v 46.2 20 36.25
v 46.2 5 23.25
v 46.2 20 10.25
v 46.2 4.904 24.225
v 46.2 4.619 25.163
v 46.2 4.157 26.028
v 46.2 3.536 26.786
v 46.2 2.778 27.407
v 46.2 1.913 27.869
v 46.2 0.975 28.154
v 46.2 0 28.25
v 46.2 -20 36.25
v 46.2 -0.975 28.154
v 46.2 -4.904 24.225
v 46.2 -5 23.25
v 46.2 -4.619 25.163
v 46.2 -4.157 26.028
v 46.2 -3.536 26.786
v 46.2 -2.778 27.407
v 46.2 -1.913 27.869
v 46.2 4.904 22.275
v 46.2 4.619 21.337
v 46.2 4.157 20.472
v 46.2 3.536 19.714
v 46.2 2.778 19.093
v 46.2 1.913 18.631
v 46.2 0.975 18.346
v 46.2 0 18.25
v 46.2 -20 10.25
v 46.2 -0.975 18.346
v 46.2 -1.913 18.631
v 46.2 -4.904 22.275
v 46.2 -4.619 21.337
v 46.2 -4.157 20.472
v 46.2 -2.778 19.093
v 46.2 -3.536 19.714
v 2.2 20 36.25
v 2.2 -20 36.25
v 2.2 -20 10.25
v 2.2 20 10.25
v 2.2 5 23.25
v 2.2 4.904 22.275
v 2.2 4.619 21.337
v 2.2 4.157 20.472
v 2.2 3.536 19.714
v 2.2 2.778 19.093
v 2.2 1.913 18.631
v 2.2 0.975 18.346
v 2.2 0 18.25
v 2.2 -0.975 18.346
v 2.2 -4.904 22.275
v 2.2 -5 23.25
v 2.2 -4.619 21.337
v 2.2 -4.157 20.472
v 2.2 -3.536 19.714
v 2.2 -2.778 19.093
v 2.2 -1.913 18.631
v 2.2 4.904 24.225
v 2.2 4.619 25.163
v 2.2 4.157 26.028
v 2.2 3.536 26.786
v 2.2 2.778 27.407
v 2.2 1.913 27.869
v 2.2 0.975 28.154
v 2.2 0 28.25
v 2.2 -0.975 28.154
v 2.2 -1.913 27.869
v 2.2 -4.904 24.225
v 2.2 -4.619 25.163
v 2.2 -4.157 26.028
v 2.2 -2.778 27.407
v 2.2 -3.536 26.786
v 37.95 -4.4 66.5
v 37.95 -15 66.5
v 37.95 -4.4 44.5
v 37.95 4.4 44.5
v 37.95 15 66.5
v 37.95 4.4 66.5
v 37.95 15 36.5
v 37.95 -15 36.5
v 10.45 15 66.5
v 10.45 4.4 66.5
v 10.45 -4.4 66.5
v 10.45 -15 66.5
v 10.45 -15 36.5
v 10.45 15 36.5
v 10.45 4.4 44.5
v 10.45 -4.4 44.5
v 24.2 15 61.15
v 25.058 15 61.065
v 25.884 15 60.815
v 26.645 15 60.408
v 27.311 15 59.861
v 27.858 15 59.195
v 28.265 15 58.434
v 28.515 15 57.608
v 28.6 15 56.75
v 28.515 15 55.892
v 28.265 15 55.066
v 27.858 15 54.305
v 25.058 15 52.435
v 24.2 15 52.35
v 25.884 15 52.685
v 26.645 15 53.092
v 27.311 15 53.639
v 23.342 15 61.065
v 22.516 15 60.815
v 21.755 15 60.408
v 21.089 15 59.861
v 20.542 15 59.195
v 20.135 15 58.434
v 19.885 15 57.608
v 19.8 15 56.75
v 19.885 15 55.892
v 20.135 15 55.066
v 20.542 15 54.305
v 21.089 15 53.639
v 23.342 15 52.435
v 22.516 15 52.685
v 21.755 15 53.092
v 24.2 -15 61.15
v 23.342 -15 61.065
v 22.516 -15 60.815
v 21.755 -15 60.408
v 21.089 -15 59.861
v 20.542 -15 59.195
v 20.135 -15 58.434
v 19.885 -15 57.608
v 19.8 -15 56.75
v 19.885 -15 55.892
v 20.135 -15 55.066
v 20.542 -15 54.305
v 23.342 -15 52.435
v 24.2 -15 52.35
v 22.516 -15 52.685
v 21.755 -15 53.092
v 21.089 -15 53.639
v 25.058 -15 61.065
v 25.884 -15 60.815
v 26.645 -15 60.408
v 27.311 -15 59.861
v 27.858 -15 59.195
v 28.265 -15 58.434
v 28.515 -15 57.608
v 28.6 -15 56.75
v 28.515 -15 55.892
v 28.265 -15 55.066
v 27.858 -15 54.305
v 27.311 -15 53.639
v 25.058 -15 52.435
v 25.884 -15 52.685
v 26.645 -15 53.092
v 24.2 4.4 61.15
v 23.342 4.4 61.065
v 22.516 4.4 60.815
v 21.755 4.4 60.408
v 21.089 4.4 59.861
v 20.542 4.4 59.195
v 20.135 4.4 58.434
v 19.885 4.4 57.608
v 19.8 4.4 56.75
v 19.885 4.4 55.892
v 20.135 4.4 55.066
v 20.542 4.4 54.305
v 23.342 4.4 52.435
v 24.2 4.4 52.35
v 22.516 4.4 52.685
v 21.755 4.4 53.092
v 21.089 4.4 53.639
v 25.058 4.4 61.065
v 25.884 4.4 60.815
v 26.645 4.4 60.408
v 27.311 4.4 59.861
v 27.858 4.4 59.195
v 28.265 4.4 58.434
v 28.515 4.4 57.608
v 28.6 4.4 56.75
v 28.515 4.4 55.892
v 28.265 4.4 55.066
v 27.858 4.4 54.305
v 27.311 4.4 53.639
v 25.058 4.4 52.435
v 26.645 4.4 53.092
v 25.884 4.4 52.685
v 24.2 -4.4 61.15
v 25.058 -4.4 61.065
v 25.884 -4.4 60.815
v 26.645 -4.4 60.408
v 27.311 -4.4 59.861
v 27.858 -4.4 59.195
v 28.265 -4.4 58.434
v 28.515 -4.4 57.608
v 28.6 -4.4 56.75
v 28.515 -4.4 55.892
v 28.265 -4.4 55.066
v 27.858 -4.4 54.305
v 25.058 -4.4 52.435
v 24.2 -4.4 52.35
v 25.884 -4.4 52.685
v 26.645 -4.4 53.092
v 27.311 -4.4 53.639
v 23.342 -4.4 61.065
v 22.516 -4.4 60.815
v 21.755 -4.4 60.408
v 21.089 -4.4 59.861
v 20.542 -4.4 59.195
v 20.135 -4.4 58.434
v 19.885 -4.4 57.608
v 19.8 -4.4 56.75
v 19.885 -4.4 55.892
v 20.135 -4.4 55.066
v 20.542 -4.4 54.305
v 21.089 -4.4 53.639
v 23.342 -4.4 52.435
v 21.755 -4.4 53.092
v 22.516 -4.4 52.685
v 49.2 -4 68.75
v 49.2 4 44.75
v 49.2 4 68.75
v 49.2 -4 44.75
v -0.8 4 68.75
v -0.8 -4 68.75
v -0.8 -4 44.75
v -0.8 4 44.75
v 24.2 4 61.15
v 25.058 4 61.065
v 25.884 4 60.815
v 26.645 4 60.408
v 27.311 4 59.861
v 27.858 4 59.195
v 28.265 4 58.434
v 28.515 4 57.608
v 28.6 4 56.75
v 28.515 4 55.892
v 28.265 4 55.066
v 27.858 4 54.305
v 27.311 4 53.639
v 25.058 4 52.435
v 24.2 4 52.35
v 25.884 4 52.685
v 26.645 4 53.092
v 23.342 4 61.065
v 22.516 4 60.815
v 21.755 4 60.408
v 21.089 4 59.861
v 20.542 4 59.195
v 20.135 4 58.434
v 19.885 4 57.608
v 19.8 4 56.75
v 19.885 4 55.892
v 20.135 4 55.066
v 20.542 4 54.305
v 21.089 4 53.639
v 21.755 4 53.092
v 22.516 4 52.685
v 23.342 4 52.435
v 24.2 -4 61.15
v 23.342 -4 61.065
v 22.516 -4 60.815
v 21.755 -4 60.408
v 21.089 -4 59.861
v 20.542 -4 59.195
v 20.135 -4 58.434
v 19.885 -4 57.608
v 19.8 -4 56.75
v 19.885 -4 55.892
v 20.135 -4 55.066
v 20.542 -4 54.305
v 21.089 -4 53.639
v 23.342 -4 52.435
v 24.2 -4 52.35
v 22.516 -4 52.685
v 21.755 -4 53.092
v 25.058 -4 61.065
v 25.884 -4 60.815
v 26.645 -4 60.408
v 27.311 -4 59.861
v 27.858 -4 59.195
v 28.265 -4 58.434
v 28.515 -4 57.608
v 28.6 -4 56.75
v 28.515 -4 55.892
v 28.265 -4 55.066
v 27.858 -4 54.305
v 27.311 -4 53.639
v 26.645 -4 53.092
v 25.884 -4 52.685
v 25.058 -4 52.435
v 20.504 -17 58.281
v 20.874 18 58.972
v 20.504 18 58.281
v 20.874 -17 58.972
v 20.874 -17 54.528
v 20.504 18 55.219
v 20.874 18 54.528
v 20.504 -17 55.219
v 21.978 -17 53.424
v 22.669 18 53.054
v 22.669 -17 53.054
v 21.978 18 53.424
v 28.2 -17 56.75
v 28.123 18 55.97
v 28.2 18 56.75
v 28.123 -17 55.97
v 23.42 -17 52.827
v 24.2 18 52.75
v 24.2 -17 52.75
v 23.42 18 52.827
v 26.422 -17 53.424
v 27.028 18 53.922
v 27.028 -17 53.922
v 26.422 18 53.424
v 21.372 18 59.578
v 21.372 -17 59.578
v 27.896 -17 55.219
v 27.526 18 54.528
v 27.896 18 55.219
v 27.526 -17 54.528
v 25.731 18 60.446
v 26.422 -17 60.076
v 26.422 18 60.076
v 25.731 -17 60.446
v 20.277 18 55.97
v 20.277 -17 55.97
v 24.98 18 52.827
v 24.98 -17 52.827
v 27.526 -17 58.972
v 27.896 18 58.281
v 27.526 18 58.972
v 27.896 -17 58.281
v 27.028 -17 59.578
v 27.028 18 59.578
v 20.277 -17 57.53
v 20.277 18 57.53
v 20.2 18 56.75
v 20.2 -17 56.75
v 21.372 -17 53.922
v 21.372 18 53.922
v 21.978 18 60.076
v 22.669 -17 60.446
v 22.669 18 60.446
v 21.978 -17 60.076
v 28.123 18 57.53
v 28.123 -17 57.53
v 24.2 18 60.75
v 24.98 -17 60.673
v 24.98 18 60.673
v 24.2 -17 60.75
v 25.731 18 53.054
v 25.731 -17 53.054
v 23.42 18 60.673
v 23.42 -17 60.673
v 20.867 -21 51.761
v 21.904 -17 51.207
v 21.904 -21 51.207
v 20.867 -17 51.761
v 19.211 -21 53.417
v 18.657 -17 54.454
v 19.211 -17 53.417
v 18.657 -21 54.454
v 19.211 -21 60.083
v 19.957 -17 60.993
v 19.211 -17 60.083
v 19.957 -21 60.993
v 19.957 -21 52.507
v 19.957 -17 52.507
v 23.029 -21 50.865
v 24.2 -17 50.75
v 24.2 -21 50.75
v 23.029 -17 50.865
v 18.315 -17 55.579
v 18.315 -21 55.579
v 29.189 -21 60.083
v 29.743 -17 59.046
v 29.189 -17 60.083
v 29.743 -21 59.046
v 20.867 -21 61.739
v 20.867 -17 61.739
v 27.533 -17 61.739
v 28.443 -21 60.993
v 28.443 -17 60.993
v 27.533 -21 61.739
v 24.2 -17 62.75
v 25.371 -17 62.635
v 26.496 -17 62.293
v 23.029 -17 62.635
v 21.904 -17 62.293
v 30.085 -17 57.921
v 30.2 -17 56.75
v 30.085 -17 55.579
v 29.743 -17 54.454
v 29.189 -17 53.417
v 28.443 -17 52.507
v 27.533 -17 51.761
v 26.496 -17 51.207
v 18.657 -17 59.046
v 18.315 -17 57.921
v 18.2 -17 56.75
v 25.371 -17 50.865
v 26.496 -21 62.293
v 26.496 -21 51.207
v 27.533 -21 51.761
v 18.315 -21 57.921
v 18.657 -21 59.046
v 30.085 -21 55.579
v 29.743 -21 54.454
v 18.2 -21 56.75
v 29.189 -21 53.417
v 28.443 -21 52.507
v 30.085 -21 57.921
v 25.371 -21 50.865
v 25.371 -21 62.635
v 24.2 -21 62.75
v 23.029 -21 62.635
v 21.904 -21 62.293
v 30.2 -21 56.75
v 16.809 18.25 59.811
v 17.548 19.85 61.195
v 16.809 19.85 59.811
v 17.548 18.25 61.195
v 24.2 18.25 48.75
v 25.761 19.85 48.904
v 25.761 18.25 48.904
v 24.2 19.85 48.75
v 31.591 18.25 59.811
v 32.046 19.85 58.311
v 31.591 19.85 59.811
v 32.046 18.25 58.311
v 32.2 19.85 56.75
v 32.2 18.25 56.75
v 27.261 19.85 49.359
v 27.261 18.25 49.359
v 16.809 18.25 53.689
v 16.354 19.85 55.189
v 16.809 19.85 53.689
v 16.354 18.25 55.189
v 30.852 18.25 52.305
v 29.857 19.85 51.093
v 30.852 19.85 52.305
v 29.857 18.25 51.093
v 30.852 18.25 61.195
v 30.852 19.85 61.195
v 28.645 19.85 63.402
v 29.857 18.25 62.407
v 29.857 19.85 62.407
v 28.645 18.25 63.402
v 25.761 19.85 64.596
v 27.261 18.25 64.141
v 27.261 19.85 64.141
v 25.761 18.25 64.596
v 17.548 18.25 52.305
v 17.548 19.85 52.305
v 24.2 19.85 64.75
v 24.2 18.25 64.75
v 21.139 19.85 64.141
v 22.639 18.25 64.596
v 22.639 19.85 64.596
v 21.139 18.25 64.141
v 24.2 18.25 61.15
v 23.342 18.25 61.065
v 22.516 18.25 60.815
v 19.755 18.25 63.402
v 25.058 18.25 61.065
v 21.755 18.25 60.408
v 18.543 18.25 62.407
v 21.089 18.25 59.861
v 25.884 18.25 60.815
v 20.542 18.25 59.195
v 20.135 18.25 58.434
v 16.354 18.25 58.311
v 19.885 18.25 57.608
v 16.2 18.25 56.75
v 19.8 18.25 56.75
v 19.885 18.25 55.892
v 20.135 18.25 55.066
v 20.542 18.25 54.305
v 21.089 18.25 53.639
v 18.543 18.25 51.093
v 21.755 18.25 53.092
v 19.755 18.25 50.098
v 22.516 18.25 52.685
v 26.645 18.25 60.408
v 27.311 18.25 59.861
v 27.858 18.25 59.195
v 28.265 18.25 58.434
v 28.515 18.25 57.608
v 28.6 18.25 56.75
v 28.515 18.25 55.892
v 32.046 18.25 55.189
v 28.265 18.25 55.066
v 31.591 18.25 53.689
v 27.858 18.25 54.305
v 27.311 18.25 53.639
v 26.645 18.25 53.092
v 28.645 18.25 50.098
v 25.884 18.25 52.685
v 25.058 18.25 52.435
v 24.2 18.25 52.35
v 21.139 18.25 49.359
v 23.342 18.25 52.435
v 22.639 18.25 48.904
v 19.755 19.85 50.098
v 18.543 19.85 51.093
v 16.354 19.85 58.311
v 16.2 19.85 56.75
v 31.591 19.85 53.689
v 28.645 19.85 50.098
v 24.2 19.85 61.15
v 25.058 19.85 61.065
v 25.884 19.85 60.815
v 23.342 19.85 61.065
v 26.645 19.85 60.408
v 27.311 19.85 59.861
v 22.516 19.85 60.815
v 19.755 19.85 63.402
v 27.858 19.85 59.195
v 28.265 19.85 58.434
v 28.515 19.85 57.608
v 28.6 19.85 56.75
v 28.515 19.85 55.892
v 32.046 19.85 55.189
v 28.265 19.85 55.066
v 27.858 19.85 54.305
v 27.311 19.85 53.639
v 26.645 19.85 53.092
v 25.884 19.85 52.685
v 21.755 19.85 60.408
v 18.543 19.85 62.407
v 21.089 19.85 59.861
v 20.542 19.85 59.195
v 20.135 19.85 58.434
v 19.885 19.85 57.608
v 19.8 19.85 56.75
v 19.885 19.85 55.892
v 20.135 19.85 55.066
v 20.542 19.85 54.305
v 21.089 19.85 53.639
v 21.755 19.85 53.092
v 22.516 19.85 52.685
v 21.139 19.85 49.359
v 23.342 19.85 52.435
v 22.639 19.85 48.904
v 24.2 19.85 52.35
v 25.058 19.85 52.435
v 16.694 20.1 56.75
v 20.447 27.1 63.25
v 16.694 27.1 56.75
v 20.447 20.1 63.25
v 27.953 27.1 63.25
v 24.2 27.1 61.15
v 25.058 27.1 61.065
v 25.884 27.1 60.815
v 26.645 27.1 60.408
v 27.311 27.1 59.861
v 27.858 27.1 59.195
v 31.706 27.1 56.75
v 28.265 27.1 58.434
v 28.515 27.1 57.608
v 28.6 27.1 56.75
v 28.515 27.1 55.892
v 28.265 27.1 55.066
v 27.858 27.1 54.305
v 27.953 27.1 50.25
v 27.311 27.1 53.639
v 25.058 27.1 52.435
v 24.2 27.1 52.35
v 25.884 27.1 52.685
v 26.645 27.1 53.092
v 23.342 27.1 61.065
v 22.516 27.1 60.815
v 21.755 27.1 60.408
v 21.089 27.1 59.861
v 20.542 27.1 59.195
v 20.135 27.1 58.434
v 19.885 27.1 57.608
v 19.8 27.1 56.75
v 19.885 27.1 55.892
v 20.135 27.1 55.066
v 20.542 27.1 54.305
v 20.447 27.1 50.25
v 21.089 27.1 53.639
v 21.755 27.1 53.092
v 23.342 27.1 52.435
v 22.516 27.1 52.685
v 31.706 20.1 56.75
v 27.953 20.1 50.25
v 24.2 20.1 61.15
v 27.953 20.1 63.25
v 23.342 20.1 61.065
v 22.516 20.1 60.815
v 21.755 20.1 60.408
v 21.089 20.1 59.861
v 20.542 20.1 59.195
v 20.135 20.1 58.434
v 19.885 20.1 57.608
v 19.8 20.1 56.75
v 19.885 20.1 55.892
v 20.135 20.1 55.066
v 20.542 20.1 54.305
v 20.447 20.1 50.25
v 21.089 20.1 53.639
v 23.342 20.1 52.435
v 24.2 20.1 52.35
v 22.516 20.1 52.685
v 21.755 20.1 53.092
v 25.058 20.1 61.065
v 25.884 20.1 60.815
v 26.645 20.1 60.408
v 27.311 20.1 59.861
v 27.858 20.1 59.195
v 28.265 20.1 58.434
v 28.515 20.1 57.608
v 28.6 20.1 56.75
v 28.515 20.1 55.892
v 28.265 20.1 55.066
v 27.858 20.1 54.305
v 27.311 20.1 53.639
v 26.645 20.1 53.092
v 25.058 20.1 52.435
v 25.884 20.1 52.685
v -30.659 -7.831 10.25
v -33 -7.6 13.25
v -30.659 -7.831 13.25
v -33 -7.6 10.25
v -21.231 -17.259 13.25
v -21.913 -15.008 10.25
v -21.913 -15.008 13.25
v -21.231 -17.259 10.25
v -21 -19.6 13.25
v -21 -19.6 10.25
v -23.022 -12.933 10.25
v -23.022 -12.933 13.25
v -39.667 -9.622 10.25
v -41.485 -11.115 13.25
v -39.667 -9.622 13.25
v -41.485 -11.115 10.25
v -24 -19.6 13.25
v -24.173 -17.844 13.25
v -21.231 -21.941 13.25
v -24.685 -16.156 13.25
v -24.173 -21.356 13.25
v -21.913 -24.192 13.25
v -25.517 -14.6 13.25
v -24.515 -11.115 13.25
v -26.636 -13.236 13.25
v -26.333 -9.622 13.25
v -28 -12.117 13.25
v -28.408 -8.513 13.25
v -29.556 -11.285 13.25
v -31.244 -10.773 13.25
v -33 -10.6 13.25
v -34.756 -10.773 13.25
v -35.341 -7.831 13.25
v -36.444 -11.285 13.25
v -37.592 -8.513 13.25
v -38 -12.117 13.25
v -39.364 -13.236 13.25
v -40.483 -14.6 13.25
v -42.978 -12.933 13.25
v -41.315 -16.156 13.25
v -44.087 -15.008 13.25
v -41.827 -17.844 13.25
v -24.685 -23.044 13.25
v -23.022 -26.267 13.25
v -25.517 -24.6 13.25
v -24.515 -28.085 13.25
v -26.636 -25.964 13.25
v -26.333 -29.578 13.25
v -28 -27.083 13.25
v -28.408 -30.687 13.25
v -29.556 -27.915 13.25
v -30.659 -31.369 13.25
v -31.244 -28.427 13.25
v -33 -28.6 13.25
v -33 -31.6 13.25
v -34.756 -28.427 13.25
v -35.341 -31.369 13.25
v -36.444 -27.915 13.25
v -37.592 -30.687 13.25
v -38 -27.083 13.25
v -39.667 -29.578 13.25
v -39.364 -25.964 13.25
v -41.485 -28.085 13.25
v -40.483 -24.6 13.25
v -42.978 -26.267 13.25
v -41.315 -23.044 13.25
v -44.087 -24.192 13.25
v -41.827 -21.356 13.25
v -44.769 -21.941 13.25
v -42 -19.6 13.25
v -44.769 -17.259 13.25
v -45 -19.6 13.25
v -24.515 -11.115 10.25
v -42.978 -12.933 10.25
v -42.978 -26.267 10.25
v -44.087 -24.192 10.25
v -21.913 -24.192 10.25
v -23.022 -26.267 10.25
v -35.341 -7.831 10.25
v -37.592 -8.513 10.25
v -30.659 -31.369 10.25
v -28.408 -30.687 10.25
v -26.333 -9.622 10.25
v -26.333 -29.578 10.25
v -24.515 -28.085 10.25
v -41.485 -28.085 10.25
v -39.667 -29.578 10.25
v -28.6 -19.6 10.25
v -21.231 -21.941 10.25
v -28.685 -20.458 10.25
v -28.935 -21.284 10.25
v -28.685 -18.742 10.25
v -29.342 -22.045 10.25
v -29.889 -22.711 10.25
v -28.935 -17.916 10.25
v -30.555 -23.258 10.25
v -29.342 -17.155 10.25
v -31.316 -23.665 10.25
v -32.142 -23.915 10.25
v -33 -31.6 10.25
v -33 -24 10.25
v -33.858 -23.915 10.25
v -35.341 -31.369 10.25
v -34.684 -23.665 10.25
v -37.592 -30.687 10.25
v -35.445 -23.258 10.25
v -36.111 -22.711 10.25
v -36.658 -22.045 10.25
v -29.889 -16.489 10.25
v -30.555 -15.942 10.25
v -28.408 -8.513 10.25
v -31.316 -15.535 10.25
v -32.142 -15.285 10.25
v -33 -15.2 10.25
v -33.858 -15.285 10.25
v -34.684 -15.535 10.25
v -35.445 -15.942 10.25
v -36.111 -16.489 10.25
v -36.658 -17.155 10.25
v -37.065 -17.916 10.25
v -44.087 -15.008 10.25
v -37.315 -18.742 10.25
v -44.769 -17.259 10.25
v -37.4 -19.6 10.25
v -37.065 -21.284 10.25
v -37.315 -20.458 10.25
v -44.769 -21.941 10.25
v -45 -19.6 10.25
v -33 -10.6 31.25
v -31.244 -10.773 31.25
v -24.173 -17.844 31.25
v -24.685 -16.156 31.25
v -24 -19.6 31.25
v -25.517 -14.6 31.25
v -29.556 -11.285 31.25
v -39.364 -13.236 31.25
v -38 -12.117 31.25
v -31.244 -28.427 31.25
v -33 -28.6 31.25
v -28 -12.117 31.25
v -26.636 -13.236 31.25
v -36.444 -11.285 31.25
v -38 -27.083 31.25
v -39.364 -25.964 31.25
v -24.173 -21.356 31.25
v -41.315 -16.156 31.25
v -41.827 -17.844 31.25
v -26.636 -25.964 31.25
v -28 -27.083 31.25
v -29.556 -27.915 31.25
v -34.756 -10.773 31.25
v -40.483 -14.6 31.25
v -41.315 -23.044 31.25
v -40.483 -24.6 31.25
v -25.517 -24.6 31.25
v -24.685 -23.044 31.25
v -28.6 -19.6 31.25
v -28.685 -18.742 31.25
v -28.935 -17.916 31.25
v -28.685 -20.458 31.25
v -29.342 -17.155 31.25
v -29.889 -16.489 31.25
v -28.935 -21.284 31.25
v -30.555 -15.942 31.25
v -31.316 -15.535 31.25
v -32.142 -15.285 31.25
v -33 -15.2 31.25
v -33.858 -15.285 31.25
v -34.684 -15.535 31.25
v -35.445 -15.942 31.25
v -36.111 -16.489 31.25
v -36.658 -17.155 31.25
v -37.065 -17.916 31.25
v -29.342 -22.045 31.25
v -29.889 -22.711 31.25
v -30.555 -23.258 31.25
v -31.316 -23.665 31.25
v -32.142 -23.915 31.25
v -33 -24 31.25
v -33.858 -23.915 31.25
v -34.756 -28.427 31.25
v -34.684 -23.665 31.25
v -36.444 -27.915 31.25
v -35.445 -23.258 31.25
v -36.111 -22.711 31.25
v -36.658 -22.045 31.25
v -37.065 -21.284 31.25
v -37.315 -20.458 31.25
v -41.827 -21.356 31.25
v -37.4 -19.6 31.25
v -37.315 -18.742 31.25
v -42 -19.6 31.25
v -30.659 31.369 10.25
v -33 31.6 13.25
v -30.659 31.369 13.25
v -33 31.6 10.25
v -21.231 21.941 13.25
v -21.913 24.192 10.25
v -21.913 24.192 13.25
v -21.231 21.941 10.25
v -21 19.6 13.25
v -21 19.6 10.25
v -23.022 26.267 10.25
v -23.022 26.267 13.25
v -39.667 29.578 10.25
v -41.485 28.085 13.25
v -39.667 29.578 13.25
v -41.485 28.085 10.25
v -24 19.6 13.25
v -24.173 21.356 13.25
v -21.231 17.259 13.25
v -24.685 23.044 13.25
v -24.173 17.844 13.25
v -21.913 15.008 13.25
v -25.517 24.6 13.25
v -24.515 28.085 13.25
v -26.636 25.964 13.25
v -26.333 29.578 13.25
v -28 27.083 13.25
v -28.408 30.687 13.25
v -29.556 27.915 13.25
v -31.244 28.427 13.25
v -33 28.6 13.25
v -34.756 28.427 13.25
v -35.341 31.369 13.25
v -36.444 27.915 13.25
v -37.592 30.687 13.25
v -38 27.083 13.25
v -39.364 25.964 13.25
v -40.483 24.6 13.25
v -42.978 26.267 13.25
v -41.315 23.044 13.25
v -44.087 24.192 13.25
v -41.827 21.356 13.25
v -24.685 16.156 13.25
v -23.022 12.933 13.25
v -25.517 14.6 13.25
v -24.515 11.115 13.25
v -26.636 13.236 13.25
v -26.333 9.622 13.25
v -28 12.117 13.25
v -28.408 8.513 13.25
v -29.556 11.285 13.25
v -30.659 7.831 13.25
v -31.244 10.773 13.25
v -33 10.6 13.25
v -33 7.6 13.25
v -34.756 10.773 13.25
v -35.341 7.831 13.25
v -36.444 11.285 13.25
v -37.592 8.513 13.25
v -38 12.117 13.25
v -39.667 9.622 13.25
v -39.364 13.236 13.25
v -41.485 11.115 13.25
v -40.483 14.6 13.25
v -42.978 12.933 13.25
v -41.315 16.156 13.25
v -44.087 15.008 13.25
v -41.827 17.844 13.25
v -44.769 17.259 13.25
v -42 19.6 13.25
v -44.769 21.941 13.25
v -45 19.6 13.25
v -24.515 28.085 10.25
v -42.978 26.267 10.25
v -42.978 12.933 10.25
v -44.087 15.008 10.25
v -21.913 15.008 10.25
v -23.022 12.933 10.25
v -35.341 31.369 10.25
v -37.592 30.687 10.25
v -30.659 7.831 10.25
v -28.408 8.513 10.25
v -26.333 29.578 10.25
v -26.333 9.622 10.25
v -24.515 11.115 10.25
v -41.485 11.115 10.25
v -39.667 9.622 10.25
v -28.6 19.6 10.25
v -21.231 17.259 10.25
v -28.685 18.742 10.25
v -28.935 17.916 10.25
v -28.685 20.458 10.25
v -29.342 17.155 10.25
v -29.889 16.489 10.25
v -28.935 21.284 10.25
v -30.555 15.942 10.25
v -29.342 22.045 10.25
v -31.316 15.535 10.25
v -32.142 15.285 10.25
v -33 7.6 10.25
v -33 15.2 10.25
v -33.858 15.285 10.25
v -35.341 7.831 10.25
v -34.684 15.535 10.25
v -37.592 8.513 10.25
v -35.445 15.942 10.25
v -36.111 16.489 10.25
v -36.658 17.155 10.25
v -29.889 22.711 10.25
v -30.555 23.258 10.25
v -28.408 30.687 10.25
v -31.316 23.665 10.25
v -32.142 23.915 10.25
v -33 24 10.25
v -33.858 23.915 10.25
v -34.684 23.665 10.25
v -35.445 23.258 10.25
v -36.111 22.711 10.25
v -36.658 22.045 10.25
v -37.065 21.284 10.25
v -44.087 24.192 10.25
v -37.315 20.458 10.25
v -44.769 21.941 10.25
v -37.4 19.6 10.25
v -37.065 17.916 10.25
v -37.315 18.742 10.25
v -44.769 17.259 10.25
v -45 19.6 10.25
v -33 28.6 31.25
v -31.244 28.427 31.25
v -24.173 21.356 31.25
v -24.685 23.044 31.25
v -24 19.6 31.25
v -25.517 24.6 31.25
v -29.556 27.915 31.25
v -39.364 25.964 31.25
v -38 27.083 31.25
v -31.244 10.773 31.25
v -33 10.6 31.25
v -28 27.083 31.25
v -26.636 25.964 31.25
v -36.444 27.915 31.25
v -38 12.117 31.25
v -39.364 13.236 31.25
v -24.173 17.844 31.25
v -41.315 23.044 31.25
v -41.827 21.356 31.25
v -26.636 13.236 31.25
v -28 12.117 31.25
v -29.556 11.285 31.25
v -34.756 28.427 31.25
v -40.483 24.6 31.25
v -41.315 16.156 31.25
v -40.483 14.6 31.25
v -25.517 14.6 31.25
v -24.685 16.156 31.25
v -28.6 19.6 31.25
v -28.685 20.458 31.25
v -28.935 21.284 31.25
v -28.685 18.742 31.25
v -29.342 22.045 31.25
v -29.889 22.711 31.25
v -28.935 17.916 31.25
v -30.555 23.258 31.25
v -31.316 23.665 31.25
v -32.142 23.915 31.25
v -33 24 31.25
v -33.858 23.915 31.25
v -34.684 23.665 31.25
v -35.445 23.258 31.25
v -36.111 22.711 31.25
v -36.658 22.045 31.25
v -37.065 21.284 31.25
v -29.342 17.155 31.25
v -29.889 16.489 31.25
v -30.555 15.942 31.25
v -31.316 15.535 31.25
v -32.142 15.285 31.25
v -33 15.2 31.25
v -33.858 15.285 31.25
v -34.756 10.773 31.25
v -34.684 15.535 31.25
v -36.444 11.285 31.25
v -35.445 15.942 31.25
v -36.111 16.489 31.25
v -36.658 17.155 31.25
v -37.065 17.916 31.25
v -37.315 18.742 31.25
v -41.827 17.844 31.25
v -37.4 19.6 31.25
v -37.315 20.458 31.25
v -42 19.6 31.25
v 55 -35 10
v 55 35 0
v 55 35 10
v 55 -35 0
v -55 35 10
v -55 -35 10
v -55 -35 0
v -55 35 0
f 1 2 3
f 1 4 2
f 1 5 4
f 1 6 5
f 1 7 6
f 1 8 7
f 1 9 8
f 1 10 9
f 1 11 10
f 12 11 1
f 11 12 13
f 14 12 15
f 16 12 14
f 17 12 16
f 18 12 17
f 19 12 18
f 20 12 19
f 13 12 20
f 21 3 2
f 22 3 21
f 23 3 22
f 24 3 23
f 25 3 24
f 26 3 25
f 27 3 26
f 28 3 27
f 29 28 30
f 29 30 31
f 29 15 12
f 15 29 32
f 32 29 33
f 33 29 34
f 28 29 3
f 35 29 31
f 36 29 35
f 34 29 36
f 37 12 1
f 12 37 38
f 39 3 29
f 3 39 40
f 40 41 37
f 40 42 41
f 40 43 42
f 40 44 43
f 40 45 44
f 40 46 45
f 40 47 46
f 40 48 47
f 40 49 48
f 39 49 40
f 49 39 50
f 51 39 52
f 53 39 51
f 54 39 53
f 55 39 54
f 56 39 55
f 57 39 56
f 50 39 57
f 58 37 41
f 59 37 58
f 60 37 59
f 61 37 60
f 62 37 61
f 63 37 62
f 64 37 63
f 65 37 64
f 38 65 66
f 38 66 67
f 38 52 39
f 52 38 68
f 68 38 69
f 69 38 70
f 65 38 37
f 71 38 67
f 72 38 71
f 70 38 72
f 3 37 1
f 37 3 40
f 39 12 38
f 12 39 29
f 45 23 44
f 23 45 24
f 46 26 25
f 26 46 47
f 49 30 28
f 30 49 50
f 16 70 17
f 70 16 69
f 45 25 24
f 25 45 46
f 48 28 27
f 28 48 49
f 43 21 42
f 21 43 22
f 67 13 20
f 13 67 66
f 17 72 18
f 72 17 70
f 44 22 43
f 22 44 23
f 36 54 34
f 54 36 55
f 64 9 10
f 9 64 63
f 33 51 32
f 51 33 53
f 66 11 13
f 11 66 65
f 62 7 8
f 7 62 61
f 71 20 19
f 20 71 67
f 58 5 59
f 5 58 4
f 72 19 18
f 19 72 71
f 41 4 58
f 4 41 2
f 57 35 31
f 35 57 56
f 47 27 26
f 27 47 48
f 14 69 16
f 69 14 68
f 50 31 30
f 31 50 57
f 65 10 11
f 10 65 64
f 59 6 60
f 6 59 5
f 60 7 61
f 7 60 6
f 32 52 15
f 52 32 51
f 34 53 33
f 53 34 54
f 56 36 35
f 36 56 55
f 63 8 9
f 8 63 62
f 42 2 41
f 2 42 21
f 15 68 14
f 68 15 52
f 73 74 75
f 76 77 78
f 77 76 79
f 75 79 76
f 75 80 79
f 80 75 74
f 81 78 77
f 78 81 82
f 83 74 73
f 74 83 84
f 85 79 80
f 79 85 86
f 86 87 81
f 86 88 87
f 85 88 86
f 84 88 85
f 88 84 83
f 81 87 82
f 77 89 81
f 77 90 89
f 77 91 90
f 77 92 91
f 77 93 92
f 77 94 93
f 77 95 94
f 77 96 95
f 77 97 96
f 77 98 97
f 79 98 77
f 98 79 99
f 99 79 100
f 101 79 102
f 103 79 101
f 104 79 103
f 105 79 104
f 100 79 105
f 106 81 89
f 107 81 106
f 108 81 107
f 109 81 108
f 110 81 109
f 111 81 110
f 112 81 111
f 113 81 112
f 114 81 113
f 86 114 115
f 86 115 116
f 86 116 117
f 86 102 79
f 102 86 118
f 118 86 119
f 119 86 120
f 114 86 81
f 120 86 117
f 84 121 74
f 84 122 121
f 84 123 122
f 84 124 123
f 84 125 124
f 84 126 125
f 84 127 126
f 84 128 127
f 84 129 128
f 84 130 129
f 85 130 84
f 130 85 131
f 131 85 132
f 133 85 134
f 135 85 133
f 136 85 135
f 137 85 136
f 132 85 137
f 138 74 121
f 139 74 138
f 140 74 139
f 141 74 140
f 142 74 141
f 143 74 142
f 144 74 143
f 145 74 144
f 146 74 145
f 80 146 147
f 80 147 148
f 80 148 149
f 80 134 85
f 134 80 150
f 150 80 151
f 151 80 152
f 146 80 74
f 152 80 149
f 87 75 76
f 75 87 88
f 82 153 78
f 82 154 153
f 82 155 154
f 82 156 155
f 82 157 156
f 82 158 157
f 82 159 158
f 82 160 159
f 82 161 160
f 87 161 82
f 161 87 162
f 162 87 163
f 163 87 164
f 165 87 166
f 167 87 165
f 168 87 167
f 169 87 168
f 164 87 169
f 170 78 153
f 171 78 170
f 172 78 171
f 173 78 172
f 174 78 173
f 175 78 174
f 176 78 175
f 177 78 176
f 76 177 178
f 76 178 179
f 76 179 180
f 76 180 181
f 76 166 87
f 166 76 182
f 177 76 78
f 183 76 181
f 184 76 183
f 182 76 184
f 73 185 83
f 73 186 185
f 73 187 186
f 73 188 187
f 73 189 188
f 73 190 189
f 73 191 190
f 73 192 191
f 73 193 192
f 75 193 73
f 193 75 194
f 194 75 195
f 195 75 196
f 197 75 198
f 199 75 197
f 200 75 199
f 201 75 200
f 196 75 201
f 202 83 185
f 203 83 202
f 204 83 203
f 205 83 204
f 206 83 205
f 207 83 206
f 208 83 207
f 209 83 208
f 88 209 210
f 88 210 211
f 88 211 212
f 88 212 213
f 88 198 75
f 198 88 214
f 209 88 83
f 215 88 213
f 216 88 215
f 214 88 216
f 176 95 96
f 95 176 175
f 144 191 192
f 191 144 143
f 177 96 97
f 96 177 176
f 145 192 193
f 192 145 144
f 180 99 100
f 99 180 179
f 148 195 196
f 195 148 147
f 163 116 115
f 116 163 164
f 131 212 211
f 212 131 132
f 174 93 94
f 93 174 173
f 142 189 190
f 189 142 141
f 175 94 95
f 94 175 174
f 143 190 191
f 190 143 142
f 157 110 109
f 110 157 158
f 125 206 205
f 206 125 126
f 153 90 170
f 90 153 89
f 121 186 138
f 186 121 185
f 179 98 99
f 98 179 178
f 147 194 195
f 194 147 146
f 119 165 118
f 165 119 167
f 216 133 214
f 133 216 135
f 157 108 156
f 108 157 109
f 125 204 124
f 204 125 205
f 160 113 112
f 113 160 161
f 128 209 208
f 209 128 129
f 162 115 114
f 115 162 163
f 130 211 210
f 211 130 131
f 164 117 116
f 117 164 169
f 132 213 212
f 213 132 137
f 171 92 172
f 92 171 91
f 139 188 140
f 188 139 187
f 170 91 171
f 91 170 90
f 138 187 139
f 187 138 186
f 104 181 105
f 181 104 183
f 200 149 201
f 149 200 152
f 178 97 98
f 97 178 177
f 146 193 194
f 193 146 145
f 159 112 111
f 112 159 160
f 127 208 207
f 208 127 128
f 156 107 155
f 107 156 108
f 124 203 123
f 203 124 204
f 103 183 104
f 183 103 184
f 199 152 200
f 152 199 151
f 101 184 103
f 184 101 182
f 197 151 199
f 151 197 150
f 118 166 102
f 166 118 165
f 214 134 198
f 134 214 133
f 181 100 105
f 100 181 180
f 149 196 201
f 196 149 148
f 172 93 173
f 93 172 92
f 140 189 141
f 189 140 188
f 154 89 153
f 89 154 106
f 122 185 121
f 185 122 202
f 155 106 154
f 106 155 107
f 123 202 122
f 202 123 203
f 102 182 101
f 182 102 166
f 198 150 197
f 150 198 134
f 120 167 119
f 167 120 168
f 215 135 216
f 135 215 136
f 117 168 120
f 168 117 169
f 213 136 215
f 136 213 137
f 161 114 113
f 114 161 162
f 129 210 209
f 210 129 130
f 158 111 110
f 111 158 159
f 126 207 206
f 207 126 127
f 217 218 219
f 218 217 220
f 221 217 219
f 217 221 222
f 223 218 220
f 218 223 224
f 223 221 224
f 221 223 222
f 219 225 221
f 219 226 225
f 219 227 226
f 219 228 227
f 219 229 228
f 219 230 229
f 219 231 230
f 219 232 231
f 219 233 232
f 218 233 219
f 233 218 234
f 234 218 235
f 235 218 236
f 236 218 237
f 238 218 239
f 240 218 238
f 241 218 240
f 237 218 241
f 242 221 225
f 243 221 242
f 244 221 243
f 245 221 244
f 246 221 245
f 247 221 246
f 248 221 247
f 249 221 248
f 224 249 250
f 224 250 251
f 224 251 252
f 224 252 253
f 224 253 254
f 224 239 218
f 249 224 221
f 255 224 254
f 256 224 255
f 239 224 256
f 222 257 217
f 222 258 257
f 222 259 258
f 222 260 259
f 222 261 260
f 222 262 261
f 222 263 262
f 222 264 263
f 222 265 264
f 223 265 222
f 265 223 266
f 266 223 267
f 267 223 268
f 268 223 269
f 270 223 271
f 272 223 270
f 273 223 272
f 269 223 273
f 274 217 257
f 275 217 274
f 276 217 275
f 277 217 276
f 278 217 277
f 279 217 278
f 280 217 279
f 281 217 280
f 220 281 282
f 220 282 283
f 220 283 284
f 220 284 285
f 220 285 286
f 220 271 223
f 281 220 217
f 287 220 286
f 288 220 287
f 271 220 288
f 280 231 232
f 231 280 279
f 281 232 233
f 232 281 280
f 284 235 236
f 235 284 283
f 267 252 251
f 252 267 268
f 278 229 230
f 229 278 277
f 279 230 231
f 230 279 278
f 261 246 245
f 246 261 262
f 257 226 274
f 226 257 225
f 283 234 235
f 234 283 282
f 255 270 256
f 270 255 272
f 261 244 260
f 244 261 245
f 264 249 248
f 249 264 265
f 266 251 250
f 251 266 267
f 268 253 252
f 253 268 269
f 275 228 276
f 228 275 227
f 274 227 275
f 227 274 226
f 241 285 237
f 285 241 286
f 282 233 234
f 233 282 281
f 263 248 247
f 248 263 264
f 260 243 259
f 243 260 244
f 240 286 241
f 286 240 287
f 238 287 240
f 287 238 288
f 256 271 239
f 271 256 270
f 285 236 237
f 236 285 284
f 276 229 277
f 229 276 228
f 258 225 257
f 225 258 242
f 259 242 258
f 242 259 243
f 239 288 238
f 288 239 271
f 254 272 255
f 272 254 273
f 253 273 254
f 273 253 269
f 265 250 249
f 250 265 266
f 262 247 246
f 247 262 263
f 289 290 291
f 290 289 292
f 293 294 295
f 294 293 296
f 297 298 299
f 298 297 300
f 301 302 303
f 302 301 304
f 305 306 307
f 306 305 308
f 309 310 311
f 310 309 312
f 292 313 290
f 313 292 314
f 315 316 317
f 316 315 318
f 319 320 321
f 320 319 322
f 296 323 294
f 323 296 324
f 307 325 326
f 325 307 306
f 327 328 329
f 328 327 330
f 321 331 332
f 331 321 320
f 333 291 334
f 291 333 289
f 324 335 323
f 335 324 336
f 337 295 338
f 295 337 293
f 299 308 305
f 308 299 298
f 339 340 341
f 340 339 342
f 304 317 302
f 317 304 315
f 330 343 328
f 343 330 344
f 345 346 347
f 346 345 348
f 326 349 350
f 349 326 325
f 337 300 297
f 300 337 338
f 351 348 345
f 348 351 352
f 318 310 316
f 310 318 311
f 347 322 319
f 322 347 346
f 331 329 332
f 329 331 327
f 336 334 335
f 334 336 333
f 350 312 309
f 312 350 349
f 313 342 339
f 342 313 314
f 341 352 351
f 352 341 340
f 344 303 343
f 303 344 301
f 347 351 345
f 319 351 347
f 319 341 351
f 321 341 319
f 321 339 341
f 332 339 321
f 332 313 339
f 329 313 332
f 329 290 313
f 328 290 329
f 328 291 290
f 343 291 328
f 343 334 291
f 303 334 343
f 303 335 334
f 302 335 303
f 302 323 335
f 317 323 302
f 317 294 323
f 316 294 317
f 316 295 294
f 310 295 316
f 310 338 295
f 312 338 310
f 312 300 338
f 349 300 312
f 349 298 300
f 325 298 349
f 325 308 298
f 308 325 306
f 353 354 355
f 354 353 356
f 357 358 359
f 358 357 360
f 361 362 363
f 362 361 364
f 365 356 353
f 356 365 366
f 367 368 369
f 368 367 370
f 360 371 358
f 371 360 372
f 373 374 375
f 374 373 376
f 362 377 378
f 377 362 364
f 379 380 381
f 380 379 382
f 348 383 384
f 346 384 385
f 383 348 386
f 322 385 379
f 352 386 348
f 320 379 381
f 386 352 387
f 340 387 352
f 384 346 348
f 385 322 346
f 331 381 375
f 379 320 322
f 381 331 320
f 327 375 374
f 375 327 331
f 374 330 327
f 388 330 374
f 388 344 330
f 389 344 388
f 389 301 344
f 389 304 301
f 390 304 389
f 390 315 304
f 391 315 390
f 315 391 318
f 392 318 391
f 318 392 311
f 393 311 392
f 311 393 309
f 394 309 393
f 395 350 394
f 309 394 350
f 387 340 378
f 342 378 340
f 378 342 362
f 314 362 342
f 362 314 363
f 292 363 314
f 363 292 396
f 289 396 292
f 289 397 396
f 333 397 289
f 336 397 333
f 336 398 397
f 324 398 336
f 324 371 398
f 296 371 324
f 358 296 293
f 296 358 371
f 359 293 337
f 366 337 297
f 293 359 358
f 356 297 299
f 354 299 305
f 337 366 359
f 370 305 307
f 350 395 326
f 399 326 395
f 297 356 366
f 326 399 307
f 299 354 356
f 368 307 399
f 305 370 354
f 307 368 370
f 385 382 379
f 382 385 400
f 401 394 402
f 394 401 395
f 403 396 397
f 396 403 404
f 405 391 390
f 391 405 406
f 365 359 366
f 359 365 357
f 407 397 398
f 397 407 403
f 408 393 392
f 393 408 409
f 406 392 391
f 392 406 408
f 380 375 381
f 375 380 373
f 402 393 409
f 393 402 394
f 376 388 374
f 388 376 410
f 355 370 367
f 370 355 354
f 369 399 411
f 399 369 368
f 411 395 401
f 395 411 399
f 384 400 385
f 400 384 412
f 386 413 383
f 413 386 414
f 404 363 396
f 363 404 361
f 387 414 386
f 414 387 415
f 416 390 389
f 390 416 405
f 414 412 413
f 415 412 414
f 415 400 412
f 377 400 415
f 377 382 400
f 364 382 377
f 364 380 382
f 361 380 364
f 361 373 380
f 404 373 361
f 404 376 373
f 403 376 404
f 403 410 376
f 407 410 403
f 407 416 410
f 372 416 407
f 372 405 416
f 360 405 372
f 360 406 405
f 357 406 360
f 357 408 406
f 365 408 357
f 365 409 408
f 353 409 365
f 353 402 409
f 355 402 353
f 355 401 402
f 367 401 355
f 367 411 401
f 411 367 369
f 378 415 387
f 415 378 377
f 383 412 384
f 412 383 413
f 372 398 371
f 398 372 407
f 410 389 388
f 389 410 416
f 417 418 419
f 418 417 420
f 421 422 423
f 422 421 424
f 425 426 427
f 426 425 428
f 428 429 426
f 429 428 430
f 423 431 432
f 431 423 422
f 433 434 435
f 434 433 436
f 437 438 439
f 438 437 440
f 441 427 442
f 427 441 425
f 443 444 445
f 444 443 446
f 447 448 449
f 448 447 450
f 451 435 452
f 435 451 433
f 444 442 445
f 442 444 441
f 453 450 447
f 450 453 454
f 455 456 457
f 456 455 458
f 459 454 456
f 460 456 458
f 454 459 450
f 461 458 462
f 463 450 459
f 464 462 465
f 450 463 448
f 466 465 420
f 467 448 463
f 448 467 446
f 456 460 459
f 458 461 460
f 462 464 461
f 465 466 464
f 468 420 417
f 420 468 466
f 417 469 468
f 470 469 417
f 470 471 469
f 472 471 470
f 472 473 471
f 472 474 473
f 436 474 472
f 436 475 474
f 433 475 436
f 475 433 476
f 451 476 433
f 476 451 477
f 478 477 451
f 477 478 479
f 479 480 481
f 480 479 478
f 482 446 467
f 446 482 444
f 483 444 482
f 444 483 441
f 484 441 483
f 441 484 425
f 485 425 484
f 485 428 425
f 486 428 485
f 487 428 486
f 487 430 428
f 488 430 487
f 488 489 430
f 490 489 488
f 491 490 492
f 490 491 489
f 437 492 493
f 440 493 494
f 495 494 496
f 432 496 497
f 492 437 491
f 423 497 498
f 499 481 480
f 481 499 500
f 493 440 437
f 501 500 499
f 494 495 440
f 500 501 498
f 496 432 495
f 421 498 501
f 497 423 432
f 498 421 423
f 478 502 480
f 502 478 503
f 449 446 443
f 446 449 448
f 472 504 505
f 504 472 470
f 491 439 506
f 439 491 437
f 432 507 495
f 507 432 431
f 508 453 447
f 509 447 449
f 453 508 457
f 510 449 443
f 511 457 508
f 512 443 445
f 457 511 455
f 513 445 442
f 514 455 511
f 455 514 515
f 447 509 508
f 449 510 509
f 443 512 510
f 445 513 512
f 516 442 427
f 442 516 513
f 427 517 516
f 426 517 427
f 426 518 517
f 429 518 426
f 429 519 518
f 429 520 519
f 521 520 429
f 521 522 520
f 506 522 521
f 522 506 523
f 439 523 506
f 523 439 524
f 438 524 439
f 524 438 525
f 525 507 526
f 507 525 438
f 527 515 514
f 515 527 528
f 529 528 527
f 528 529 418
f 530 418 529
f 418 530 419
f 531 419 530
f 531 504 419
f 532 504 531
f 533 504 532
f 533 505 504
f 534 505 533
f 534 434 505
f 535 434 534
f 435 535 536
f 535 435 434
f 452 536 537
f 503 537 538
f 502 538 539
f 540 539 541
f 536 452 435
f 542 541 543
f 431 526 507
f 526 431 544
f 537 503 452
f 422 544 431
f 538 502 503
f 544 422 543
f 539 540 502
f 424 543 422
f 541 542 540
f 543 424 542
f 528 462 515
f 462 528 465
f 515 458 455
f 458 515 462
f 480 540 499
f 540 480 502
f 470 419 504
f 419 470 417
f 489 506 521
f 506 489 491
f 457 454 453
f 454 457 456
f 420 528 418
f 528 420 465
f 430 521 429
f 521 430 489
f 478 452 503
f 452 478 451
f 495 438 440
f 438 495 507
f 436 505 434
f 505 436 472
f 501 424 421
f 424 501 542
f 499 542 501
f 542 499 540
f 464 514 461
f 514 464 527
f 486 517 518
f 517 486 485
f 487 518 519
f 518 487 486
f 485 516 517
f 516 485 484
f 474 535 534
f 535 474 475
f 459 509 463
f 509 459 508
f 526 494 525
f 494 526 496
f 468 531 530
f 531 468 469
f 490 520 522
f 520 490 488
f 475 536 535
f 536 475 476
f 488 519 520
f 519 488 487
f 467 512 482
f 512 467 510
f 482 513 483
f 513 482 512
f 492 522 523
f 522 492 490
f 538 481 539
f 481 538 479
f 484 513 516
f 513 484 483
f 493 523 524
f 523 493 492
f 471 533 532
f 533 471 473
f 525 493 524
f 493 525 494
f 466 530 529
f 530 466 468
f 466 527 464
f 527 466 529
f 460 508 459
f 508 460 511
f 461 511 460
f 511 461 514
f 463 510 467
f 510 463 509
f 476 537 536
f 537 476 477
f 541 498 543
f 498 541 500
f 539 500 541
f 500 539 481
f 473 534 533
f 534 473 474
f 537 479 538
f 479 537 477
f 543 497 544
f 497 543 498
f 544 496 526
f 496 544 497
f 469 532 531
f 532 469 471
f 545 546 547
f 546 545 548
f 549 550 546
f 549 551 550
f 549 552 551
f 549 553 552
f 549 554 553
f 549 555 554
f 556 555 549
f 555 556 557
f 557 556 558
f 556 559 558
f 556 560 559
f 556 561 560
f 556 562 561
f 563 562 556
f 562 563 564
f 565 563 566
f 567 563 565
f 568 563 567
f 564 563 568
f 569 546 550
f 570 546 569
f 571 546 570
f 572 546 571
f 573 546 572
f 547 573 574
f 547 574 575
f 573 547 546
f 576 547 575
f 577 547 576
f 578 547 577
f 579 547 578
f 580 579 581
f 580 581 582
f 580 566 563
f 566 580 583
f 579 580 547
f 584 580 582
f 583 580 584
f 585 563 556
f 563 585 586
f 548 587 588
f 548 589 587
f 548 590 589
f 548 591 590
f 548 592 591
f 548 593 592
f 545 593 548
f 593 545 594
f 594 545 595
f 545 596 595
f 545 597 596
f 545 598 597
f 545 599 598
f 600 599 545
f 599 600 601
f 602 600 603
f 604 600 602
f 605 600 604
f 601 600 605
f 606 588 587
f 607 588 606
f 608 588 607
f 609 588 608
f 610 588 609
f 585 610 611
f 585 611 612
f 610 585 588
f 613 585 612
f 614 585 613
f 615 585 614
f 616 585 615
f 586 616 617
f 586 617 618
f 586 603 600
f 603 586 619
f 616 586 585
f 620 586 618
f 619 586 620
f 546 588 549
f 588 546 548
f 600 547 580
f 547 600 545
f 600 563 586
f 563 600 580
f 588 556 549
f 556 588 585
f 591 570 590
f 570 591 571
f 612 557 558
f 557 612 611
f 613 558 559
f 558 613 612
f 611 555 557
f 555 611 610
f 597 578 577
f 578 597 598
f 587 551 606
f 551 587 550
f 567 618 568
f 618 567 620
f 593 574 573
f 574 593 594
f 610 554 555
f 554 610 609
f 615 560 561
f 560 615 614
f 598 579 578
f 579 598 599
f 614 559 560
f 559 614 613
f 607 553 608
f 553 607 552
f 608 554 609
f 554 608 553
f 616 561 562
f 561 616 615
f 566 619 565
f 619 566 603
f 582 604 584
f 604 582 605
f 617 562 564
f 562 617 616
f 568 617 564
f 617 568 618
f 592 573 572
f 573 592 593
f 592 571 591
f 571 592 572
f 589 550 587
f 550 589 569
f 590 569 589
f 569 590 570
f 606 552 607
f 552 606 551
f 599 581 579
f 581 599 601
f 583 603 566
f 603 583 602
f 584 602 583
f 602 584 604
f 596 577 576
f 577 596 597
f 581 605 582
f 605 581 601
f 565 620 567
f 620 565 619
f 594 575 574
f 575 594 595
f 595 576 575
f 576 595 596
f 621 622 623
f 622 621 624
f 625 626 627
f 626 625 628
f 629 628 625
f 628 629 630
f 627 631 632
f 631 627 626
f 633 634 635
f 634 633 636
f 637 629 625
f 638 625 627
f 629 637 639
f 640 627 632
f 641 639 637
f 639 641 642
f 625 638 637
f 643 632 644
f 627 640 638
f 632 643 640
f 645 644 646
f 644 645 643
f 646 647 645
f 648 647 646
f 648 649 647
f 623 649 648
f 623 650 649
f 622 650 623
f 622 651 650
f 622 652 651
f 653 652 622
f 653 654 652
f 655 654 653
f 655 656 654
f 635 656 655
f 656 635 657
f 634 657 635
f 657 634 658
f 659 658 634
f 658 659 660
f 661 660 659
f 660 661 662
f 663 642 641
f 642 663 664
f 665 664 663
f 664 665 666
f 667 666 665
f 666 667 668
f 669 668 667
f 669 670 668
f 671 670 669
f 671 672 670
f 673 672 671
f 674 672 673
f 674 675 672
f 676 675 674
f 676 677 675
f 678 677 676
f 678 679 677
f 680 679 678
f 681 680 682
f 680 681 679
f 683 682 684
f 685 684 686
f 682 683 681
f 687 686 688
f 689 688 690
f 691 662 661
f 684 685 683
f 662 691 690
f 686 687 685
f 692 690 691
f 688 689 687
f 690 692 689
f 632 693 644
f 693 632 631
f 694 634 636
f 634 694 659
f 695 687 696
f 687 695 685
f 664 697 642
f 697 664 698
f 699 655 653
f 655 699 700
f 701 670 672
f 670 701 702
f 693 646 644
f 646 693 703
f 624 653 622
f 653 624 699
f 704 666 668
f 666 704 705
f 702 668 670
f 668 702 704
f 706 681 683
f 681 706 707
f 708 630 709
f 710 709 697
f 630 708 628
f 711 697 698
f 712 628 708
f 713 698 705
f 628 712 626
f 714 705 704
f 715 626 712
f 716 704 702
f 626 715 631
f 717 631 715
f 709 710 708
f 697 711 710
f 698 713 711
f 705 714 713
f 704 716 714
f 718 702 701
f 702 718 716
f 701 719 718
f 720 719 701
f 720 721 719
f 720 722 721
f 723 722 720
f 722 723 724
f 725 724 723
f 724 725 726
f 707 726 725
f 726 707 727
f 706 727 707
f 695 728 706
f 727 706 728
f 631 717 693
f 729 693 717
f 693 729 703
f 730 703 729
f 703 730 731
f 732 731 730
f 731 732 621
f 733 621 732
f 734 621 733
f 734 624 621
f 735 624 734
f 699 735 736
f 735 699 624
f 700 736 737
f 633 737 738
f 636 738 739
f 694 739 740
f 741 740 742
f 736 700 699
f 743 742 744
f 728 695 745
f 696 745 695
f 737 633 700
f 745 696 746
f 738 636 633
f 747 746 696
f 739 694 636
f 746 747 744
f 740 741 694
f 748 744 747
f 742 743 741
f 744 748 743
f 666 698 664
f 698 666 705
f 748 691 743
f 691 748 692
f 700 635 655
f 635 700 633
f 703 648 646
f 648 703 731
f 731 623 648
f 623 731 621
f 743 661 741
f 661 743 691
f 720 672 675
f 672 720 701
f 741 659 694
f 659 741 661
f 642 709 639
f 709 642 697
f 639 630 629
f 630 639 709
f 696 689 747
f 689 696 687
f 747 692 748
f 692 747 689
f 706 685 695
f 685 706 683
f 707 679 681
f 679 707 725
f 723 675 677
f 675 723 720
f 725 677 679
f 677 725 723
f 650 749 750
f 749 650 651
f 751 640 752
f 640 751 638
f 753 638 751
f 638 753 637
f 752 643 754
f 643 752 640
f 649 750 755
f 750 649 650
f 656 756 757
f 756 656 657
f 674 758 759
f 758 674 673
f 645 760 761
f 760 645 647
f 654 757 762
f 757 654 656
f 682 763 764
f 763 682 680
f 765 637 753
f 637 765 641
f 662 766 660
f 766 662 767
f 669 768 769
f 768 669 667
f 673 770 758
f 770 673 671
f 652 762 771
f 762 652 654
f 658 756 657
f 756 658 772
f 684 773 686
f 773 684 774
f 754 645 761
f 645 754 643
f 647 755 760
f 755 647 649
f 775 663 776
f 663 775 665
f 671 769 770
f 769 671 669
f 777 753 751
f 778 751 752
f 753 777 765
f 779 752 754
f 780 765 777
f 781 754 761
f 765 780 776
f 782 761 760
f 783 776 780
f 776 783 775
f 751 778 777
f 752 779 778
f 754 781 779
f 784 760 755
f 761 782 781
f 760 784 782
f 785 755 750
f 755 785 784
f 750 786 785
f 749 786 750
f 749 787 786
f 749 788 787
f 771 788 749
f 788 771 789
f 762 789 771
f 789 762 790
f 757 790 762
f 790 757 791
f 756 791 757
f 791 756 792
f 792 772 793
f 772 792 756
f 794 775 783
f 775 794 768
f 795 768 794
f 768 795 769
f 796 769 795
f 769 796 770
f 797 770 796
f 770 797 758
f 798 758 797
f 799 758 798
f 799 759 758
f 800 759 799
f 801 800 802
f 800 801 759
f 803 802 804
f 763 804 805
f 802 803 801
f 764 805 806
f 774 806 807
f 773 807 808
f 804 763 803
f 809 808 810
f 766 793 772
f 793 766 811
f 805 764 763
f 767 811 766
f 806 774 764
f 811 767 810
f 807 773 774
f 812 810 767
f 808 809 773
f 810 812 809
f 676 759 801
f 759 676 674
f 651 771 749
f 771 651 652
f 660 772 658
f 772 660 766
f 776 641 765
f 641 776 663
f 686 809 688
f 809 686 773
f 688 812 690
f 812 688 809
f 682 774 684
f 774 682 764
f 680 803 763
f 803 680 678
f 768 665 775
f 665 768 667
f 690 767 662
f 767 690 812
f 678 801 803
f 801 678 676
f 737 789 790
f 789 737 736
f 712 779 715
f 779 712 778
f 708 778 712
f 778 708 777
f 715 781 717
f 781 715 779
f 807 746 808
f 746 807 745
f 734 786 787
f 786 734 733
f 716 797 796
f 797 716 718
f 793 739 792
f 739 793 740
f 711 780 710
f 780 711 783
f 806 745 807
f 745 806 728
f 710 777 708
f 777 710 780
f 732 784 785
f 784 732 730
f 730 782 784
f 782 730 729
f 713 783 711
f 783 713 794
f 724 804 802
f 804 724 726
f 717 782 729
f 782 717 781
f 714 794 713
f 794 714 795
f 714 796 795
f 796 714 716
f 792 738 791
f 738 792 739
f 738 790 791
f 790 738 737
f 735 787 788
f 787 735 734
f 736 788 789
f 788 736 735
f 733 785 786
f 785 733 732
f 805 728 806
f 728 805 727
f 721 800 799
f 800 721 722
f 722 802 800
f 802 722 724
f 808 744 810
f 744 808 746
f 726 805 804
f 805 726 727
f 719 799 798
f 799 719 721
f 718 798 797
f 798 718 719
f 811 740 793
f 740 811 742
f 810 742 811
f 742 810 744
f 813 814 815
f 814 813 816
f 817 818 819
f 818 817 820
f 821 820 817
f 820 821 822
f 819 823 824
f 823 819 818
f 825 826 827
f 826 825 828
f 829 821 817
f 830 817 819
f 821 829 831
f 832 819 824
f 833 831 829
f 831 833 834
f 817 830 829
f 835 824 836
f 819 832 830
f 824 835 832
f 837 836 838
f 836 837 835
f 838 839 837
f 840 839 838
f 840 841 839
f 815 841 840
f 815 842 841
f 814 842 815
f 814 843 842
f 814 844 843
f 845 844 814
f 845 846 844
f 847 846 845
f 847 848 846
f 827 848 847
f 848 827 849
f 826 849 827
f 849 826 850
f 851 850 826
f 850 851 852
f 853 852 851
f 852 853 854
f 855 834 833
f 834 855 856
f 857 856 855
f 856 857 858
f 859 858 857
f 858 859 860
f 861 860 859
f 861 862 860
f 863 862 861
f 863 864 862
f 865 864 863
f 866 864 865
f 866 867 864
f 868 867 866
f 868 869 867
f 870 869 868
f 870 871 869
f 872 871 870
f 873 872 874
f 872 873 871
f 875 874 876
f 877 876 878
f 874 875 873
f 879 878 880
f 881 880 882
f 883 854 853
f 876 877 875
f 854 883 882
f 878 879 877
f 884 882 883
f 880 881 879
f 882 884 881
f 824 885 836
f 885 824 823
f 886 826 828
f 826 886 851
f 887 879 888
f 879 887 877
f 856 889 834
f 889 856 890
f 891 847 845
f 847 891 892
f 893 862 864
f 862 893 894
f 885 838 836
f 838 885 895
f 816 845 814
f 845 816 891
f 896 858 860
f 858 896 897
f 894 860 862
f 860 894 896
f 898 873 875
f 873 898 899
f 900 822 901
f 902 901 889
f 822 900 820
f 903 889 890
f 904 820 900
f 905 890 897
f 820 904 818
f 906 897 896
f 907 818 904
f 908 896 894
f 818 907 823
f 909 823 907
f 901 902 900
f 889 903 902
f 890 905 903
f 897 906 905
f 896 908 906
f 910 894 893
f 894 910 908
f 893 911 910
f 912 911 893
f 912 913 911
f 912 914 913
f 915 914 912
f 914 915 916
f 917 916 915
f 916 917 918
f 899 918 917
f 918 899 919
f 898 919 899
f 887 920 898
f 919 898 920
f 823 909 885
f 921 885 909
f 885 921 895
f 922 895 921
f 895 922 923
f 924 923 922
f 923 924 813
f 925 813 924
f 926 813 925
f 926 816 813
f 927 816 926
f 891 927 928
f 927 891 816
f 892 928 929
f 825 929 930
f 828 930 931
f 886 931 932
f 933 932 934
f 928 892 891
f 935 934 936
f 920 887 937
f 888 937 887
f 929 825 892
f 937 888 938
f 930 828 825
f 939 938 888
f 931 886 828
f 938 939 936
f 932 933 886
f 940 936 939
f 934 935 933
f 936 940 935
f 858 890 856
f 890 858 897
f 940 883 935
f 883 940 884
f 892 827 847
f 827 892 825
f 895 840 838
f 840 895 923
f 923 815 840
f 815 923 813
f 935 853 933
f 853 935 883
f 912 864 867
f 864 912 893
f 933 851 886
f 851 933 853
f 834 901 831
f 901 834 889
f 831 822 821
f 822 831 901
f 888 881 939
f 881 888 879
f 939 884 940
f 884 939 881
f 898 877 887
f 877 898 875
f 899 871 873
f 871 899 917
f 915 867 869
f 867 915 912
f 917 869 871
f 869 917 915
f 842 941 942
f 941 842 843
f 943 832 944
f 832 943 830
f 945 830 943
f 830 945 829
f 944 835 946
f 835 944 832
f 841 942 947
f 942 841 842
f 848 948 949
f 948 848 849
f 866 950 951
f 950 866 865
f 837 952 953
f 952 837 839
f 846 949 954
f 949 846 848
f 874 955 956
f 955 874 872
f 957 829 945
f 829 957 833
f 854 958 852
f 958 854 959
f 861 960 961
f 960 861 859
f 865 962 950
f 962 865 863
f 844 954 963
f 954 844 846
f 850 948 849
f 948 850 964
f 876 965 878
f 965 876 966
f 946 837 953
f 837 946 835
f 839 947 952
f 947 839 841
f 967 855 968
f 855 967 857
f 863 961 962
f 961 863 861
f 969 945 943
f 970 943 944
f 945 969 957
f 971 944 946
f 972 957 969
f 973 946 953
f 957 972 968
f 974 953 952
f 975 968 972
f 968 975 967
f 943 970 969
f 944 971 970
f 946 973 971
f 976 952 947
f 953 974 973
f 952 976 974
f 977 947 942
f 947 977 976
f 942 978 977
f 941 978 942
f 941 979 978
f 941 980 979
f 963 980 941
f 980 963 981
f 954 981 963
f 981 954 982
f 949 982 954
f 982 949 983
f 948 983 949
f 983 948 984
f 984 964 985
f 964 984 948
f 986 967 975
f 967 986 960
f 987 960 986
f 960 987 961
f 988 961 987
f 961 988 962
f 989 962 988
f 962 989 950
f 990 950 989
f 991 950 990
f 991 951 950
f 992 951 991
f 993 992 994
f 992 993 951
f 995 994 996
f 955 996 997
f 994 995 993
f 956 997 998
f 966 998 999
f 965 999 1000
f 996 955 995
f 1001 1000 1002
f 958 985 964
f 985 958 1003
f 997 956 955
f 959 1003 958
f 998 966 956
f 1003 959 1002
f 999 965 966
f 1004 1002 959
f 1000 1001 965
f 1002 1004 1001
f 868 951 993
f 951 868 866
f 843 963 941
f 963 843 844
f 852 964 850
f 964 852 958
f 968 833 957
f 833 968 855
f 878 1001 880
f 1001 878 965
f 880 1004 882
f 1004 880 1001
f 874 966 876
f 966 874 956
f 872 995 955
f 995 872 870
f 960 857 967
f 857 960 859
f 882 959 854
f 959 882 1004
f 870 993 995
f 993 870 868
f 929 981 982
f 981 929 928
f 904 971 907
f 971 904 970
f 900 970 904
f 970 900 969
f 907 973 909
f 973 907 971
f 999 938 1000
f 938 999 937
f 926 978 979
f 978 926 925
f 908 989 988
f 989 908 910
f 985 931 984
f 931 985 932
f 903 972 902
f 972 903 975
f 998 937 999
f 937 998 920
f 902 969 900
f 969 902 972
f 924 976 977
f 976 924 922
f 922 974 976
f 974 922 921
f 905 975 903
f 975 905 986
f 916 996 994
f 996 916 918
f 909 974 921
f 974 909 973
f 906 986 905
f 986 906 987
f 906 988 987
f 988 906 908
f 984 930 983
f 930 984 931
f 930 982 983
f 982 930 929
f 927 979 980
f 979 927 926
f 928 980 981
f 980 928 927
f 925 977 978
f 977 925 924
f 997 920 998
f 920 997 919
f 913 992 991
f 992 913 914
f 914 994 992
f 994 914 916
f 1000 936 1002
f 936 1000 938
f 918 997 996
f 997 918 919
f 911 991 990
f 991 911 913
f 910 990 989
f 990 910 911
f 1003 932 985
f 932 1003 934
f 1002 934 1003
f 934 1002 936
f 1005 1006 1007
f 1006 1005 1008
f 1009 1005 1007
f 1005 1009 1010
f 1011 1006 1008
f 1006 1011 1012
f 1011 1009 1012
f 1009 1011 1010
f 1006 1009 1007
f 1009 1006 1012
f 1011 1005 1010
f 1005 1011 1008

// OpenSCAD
$fn = 32;

// ------------------------------------------------------------------------
// Indexing jig: plate 110 x 70 mm, pin d8
// Every part is its own module, assembly() places every instance.
// ------------------------------------------------------------------------

// --- part 1 ---
module jig_plate() {
  difference() {
    translate([-55, -35, 0]) cube([110, 70, 10]);
  }
}

// --- part 2 ---
module locator_block() {
  difference() {
    translate([-22, -20, 0]) cube([44, 40, 26]);
    translate([0, 0, 13]) rotate([0, 90, 0]) cylinder(h = 46, d = 10, center = true);
  }
}

// --- part 3 ---
module index_fork() {
  difference() {
    translate([-13.75, -15, 0]) cube([27.5, 30, 30]);
    translate([-14.75, -4.4, 8]) cube([29.5, 8.8, 23]);
    translate([0, 0, 20.25]) rotate([90, 0, 0]) cylinder(h = 32, d = 8.8, center = true);
  }
}

// --- part 4 ---
module index_arm() {
  difference() {
    translate([-25, -4, 0]) cube([50, 8, 24]);
    translate([0, 0, 12]) rotate([90, 0, 0]) cylinder(h = 10, d = 8.8, center = true);
  }
}

// --- part 5 ---
module index_pin() {
  rotate([0, 90, 0]) cylinder(h = 36, d = 8, center = true);
  translate([-21, 0, 0]) rotate([0, 90, 0]) cylinder(h = 4, d = 12);
}

// --- part 6 ---
module pin_washer() {
  difference() {
      translate([0, 0, 0]) cylinder(h = 1.6, d = 16);
      translate([0, 0, -1]) cylinder(h = 3.6, d = 8.8);
    }
}

// --- part 7 ---
module lock_nut() {
  difference() {
    linear_extrude(height = 7) polygon(points = [[7.506, 0], [3.753, 6.5], [-3.753, 6.5], [-7.506, 0], [-3.753, -6.5], [3.753, -6.5]]);
    translate([0, 0, -1]) cylinder(h = 9, d = 8.8);
  }
}

// --- part 8 ---
module guide_bush_a() {
  difference() {
    union() {
      cylinder(h = 3, d = 24);
      translate([0, 0, 3]) cylinder(h = 18, d = 18);
    }
    translate([0, 0, -1]) cylinder(h = 23, d = 8.8);
  }
}

// --- part 9 ---
module guide_bush_b() {
  difference() {
    union() {
      cylinder(h = 3, d = 24);
      translate([0, 0, 3]) cylinder(h = 18, d = 18);
    }
    translate([0, 0, -1]) cylinder(h = 23, d = 8.8);
  }
}

// --- assembly ---
module assembly() {
  color([0.80, 0.24, 0.20]) translate([0, 0, 0]) rotate([0, 0, 0]) jig_plate();
  color([0.20, 0.45, 0.75]) translate([24.2, 0, 10.25]) rotate([0, 0, 0]) locator_block();
  color([0.25, 0.62, 0.32]) translate([24.2, 0, 36.5]) rotate([0, 0, 0]) index_fork();
  color([0.92, 0.70, 0.18]) translate([24.2, 0, 44.75]) rotate([0, 0, 0]) index_arm();
  color([0.58, 0.35, 0.70]) translate([24.2, 0, 56.75]) rotate([0, 0, 90]) index_pin();
  color([0.16, 0.66, 0.66]) translate([24.2, 19.85, 56.75]) rotate([90, 0, 0]) pin_washer();
  color([0.85, 0.48, 0.18]) translate([24.2, 27.1, 56.75]) rotate([90, 0, 0]) lock_nut();
  color([0.55, 0.60, 0.65]) translate([-33, -19.6, 10.25]) rotate([0, 0, 0]) guide_bush_a();
  color([0.75, 0.30, 0.55]) translate([-33, 19.6, 10.25]) rotate([0, 0, 0]) guide_bush_b();
}

assembly();
